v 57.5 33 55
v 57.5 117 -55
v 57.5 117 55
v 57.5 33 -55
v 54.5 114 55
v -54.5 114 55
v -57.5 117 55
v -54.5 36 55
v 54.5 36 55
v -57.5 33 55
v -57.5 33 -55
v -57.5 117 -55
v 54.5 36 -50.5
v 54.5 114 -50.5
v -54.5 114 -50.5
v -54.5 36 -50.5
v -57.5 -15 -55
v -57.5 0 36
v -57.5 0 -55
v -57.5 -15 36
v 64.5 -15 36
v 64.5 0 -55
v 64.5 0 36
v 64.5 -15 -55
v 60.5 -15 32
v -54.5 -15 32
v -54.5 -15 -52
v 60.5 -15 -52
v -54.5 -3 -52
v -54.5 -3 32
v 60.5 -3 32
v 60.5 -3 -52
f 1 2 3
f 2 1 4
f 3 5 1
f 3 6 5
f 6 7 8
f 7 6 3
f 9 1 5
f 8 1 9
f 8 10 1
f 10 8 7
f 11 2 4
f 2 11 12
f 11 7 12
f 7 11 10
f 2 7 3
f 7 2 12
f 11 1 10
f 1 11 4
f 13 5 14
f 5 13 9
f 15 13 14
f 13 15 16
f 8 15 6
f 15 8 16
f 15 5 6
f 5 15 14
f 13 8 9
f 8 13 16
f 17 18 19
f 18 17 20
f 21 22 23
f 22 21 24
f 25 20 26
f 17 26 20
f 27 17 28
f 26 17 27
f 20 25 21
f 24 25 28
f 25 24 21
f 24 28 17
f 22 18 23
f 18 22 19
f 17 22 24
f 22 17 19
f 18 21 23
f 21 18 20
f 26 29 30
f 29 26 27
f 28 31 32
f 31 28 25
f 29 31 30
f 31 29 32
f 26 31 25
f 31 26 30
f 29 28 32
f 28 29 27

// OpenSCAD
// This makes a box for 12 gauge shells. The width of box (w) can be changed for either 3.5 inch magnum shells (97MM), or 2.75 inch shells (78MM). The box can also be changed into any dimension needed. The 3MM walls will stay that thickness.
// All of these dimensions are in MM.

//Box frame for shells
$fn=50;
l = 115; //overall length in X direction
w = 84; //76.2MM shells, with 3MM walls, (97mm for 3.5 inch mags), (78mm for 2.75 inch shells)
h = 110; //height of box (22mm per row of shells.)
l2 = l-6;
w2 = w-6;
h2 = h-3;
difference(){
    translate([0,75,0])cube([l, w, h], center = true);
    translate([0,075,3])cube([l2,w2,h2], center = true);
}
//LID Code
L = l+7;
W = w+7;
H = 15;
difference(){
    rotate([90,0,0])translate([-l/2,-h/2,0])cube([L,W,H]);
    rotate([90,0,0])translate([(-l/2)+3,(-h/2)+3,3])cube([l,w,h]);
} 
